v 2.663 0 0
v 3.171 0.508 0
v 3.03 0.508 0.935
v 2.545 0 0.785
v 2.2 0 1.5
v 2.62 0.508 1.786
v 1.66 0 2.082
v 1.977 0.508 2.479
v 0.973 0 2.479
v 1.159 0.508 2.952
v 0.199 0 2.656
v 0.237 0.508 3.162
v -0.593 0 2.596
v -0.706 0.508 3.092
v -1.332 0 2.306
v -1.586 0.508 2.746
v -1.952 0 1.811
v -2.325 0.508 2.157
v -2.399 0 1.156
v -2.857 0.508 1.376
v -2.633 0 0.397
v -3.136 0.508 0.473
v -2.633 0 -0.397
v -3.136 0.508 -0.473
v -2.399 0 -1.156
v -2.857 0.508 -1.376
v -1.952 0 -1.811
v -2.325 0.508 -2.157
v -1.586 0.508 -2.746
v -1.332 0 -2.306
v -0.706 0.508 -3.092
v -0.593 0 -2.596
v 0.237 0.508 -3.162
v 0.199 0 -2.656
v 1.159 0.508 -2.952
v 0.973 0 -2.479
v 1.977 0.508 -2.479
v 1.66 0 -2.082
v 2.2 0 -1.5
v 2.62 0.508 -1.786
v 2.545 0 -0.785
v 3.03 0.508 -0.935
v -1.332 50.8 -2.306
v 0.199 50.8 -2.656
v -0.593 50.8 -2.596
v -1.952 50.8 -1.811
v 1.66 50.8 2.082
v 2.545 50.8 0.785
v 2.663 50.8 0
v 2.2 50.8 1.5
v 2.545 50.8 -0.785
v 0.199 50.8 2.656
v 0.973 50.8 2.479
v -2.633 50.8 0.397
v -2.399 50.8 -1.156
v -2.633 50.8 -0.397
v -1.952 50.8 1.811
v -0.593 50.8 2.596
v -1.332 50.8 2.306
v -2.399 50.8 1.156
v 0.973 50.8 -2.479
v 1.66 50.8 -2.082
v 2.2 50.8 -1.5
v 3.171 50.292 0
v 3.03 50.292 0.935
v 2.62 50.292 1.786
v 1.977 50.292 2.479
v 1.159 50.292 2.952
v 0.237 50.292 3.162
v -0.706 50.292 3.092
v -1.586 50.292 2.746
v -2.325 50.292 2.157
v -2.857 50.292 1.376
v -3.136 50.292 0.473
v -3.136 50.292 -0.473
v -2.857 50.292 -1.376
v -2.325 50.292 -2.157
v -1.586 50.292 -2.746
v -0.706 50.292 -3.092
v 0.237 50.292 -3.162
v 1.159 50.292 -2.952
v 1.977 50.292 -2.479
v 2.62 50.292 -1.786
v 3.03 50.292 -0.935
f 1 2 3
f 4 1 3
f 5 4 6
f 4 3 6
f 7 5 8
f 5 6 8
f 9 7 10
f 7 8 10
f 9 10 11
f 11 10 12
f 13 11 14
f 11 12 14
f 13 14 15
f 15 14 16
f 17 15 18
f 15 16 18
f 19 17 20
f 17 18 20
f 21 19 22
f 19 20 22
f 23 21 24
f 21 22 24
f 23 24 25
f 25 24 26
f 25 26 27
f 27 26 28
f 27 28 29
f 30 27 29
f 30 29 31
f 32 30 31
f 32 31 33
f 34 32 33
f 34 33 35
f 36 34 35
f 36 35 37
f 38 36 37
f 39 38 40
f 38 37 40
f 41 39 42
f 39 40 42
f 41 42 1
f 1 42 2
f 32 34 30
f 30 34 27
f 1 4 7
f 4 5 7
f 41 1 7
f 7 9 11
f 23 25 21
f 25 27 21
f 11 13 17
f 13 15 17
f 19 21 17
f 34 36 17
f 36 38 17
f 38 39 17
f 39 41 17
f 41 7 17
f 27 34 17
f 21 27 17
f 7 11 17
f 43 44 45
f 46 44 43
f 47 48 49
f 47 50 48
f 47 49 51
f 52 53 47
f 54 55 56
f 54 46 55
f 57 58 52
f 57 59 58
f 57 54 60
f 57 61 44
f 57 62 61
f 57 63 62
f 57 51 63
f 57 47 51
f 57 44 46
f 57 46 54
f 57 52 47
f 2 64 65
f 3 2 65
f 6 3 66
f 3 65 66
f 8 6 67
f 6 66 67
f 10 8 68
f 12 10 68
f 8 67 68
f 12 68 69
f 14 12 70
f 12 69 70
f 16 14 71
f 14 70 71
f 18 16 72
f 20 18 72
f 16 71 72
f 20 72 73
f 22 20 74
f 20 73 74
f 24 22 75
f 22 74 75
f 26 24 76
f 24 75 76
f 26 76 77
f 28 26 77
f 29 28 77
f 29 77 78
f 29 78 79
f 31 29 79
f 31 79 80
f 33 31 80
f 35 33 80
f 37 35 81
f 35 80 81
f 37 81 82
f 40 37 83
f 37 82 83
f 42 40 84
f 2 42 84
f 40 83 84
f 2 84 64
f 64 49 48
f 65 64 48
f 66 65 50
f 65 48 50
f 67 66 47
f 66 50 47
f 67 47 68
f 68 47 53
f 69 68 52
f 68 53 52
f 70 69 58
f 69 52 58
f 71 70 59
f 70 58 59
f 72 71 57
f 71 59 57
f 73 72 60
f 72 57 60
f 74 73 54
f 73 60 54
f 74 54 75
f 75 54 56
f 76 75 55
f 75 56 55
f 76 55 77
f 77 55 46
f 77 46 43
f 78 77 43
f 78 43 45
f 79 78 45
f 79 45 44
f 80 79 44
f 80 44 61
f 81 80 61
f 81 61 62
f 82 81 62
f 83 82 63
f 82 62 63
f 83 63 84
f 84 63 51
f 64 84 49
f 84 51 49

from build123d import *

# Parameters (mm, degrees)
SKETCH1_W     = 3.17119
SKETCH1_H     = 50.8
CHAMFER1_SIZE = 0.508
CHAMFER2_SIZE = 0.508


with BuildPart() as part:
    # Sketch1 → Revolve1 (revolve)
    with BuildSketch(Plane.XY):
        with Locations((1.585595, 25.4)):
            Rectangle(SKETCH1_W, SKETCH1_H)
    revolve(axis=Axis((0, 50.8, 0), (0, -1, 0)))

    # Chamfer1
    chamfer1_edges = [part.edges().sort_by_distance(p)[0] for p in [
        (-3.17119, 0, 0),
    ]]
    chamfer(chamfer1_edges, length=CHAMFER1_SIZE)

    # Chamfer2
    chamfer2_edges = [part.edges().sort_by_distance(p)[0] for p in [
        (-3.17119, 50.8, 0),
    ]]
    chamfer(chamfer2_edges, length=CHAMFER2_SIZE)


solid = part.part
